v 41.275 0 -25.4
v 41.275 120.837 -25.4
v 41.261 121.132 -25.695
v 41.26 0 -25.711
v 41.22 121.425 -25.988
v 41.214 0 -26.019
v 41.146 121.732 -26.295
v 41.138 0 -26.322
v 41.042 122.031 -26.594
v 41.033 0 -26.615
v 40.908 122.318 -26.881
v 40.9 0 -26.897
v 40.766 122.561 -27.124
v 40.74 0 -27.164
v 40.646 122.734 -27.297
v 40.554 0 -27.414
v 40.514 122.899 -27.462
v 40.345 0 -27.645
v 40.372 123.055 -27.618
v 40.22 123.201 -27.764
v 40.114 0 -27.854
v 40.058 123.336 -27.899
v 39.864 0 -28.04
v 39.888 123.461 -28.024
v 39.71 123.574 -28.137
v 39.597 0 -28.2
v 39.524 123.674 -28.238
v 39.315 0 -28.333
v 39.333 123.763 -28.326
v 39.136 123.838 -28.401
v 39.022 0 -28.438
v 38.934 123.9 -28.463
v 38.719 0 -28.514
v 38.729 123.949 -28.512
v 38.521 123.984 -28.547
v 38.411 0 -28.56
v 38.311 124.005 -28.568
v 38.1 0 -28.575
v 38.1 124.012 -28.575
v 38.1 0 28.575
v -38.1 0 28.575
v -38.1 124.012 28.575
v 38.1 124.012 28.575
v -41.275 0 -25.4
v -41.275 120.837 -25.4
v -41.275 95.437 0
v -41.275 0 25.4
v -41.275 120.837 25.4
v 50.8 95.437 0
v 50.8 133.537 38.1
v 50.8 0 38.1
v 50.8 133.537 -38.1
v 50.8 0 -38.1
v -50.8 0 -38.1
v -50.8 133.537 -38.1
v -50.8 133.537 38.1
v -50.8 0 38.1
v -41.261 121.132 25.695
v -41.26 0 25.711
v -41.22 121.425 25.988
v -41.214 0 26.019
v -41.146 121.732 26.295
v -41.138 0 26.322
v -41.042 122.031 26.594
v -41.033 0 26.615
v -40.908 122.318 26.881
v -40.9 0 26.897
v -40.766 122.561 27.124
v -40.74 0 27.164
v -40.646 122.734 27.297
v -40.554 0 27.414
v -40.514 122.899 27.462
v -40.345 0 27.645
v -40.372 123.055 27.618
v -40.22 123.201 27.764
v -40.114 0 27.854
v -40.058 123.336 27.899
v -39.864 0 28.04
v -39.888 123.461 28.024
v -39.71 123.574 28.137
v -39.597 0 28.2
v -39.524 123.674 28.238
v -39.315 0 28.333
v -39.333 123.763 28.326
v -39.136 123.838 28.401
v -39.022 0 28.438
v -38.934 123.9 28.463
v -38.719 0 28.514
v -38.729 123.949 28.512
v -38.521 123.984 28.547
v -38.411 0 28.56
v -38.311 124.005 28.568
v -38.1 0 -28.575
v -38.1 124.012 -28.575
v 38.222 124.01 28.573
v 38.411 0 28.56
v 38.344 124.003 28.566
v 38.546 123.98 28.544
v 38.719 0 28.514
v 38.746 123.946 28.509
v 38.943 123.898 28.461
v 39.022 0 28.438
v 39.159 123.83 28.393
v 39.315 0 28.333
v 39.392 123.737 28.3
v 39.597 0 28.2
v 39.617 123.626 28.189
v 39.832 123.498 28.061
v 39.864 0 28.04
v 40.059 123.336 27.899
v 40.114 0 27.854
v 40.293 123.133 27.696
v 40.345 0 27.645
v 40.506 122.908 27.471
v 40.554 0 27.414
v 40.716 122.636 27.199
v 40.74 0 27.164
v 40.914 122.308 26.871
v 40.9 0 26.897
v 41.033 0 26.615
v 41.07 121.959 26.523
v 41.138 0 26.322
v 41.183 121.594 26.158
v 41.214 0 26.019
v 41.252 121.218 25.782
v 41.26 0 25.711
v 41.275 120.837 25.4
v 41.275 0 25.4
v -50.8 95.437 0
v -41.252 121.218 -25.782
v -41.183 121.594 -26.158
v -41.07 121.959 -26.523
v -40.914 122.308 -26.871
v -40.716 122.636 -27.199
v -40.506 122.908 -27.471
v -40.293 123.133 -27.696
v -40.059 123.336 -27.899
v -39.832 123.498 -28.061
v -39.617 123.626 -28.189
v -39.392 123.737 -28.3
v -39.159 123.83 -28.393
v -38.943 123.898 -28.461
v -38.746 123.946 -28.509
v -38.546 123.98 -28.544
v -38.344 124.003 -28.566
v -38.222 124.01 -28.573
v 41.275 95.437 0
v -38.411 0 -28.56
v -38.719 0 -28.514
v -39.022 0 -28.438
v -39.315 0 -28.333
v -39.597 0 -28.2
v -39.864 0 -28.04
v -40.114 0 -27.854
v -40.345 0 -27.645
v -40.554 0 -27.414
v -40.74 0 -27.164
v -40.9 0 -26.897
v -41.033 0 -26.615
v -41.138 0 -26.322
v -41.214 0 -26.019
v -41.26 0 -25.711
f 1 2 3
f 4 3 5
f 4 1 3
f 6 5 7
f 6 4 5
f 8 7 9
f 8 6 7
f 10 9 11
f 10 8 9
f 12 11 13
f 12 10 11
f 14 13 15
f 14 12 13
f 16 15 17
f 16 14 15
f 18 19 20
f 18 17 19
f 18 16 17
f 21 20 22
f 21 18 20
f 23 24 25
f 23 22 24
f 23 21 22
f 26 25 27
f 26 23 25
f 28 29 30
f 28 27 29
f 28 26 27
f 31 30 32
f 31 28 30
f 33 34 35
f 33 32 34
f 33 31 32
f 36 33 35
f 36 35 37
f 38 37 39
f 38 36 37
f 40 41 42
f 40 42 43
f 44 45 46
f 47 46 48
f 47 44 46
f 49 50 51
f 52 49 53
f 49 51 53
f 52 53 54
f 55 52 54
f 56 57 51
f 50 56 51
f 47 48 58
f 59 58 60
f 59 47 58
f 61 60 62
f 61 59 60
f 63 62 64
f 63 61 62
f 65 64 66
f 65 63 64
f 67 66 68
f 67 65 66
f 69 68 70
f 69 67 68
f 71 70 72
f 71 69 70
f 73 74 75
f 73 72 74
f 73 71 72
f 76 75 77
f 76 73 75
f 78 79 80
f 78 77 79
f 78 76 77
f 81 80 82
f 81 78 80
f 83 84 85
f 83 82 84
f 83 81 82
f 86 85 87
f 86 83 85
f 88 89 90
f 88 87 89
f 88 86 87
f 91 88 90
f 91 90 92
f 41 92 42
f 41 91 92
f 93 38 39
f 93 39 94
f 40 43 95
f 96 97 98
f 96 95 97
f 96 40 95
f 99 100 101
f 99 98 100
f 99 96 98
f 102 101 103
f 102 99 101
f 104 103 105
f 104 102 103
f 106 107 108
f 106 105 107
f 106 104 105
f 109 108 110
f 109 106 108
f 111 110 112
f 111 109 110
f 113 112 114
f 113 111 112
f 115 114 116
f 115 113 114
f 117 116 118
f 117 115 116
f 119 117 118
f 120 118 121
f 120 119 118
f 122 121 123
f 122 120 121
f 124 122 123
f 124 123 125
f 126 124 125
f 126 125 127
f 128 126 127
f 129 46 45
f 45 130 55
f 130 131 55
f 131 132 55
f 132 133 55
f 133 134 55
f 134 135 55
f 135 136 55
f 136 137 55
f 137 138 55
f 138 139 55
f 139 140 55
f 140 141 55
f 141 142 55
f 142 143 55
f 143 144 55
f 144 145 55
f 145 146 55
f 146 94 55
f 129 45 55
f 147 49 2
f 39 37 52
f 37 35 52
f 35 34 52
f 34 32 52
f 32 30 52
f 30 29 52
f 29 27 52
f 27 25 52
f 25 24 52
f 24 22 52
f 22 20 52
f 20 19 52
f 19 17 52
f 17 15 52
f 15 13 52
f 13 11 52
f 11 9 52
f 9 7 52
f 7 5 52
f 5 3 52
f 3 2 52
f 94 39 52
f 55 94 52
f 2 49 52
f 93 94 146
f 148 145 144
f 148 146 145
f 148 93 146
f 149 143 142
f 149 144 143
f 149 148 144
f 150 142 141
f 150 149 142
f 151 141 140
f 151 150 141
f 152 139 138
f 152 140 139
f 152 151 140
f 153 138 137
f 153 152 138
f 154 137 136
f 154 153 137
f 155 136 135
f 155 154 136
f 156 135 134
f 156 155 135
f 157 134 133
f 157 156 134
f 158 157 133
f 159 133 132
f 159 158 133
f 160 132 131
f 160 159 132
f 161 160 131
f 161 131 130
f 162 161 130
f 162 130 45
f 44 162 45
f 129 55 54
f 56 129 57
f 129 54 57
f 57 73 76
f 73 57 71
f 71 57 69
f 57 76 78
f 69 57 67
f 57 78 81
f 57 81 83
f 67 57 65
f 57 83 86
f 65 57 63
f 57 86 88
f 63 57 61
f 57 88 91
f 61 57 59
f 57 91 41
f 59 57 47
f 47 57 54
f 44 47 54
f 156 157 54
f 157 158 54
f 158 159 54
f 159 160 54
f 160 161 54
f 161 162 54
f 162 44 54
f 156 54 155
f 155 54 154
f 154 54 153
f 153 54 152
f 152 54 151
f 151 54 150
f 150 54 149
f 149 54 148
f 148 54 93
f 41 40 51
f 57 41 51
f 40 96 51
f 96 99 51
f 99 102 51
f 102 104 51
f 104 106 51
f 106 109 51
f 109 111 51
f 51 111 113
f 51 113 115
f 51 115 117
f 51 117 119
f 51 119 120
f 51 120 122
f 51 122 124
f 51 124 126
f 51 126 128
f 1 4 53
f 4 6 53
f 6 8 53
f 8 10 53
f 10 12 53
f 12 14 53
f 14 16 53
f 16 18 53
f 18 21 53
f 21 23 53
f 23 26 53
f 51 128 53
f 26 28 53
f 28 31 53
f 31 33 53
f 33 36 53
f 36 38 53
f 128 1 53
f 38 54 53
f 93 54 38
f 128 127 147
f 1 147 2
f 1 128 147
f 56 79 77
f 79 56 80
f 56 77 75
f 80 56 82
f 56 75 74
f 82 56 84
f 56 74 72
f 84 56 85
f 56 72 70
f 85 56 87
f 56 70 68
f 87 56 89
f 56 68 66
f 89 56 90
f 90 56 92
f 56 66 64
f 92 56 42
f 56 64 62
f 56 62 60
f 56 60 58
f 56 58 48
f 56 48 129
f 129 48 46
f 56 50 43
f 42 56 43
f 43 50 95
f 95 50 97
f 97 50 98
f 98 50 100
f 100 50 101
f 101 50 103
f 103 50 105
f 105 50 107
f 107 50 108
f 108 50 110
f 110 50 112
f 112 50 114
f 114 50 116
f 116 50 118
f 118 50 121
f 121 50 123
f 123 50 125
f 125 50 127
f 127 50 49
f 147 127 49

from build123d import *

# Parameters (mm, degrees)
BOSS_EXTRUDE1_DEPTH = 508
CUT_EXTRUDE7_REACH  = 521.459


with BuildPart() as part:
    # Sketch1 → Boss-Extrude1 (new body)
    with BuildSketch(Plane(origin=(0, 0, 0), x_dir=(1, 0, 0), z_dir=(0, 1, 0))):
        Polygon((-52.613166046, -38.1), (52.613166046, -38.1), (50.8, -38.1), (50.8, -0.977324315), (50.8, 0.977324315), (50.8, 38.1), (39.913166046, 38.1), (-39.913166046, 38.1), (-50.8, 38.1), (-50.8, -24.422675685), (-50.8, 24.422675685), (-50.8, -38.1), align=None)
        with BuildLine():
            Line((-38.1, -28.575), (38.1, -28.575))
            ThreePointArc((38.1, -28.575), (40.34506403, -27.64506403), (41.275, -25.4))
            Line((41.275, -25.4), (41.275, 25.4))
            ThreePointArc((41.275, 25.4), (40.34506403, 27.64506403), (38.1, 28.575))
            Line((38.1, 28.575), (-38.1, 28.575))
            ThreePointArc((-38.1, 28.575), (-40.34506403, 27.64506403), (-41.275, 25.4))
            Line((-41.275, 25.4), (-41.275, -25.4))
            ThreePointArc((-41.275, -25.4), (-40.34506403, -27.64506403), (-38.1, -28.575))
        make_face(mode=Mode.SUBTRACT)
    extrude(amount=BOSS_EXTRUDE1_DEPTH)

    # Cut-Extrude7: up to this face of the body (flat: up to its plane)
    cut_extrude7_end = Plane(part.part.faces().sort_by_distance((-50.8, 254, 0))[0])
    # Sketch8 → Cut-Extrude7 (cut, up to the picked face)
    with BuildSketch(Plane(origin=(50.8, 0, 0), x_dir=(0, 0, -1), z_dir=(1, 0, 0)), mode=Mode.PRIVATE) as cut_extrude7_sk1:
        Polygon((-38.1, 133.5369186), (0, 95.4369186), (38.1, 133.5369186), (38.1, 508), (-38.1, 508), align=None)
    cut_extrude7_tool1 = split(extrude(cut_extrude7_sk1.sketch, amount=-CUT_EXTRUDE7_REACH, mode=Mode.PRIVATE), bisect_by=cut_extrude7_end, keep=Keep.BOTH, mode=Mode.PRIVATE)
    add(cut_extrude7_tool1.solids().sort_by(Axis((50.8, 311.089757, 0), (-1, 0, 0)))[0], mode=Mode.SUBTRACT)


solid = part.part
